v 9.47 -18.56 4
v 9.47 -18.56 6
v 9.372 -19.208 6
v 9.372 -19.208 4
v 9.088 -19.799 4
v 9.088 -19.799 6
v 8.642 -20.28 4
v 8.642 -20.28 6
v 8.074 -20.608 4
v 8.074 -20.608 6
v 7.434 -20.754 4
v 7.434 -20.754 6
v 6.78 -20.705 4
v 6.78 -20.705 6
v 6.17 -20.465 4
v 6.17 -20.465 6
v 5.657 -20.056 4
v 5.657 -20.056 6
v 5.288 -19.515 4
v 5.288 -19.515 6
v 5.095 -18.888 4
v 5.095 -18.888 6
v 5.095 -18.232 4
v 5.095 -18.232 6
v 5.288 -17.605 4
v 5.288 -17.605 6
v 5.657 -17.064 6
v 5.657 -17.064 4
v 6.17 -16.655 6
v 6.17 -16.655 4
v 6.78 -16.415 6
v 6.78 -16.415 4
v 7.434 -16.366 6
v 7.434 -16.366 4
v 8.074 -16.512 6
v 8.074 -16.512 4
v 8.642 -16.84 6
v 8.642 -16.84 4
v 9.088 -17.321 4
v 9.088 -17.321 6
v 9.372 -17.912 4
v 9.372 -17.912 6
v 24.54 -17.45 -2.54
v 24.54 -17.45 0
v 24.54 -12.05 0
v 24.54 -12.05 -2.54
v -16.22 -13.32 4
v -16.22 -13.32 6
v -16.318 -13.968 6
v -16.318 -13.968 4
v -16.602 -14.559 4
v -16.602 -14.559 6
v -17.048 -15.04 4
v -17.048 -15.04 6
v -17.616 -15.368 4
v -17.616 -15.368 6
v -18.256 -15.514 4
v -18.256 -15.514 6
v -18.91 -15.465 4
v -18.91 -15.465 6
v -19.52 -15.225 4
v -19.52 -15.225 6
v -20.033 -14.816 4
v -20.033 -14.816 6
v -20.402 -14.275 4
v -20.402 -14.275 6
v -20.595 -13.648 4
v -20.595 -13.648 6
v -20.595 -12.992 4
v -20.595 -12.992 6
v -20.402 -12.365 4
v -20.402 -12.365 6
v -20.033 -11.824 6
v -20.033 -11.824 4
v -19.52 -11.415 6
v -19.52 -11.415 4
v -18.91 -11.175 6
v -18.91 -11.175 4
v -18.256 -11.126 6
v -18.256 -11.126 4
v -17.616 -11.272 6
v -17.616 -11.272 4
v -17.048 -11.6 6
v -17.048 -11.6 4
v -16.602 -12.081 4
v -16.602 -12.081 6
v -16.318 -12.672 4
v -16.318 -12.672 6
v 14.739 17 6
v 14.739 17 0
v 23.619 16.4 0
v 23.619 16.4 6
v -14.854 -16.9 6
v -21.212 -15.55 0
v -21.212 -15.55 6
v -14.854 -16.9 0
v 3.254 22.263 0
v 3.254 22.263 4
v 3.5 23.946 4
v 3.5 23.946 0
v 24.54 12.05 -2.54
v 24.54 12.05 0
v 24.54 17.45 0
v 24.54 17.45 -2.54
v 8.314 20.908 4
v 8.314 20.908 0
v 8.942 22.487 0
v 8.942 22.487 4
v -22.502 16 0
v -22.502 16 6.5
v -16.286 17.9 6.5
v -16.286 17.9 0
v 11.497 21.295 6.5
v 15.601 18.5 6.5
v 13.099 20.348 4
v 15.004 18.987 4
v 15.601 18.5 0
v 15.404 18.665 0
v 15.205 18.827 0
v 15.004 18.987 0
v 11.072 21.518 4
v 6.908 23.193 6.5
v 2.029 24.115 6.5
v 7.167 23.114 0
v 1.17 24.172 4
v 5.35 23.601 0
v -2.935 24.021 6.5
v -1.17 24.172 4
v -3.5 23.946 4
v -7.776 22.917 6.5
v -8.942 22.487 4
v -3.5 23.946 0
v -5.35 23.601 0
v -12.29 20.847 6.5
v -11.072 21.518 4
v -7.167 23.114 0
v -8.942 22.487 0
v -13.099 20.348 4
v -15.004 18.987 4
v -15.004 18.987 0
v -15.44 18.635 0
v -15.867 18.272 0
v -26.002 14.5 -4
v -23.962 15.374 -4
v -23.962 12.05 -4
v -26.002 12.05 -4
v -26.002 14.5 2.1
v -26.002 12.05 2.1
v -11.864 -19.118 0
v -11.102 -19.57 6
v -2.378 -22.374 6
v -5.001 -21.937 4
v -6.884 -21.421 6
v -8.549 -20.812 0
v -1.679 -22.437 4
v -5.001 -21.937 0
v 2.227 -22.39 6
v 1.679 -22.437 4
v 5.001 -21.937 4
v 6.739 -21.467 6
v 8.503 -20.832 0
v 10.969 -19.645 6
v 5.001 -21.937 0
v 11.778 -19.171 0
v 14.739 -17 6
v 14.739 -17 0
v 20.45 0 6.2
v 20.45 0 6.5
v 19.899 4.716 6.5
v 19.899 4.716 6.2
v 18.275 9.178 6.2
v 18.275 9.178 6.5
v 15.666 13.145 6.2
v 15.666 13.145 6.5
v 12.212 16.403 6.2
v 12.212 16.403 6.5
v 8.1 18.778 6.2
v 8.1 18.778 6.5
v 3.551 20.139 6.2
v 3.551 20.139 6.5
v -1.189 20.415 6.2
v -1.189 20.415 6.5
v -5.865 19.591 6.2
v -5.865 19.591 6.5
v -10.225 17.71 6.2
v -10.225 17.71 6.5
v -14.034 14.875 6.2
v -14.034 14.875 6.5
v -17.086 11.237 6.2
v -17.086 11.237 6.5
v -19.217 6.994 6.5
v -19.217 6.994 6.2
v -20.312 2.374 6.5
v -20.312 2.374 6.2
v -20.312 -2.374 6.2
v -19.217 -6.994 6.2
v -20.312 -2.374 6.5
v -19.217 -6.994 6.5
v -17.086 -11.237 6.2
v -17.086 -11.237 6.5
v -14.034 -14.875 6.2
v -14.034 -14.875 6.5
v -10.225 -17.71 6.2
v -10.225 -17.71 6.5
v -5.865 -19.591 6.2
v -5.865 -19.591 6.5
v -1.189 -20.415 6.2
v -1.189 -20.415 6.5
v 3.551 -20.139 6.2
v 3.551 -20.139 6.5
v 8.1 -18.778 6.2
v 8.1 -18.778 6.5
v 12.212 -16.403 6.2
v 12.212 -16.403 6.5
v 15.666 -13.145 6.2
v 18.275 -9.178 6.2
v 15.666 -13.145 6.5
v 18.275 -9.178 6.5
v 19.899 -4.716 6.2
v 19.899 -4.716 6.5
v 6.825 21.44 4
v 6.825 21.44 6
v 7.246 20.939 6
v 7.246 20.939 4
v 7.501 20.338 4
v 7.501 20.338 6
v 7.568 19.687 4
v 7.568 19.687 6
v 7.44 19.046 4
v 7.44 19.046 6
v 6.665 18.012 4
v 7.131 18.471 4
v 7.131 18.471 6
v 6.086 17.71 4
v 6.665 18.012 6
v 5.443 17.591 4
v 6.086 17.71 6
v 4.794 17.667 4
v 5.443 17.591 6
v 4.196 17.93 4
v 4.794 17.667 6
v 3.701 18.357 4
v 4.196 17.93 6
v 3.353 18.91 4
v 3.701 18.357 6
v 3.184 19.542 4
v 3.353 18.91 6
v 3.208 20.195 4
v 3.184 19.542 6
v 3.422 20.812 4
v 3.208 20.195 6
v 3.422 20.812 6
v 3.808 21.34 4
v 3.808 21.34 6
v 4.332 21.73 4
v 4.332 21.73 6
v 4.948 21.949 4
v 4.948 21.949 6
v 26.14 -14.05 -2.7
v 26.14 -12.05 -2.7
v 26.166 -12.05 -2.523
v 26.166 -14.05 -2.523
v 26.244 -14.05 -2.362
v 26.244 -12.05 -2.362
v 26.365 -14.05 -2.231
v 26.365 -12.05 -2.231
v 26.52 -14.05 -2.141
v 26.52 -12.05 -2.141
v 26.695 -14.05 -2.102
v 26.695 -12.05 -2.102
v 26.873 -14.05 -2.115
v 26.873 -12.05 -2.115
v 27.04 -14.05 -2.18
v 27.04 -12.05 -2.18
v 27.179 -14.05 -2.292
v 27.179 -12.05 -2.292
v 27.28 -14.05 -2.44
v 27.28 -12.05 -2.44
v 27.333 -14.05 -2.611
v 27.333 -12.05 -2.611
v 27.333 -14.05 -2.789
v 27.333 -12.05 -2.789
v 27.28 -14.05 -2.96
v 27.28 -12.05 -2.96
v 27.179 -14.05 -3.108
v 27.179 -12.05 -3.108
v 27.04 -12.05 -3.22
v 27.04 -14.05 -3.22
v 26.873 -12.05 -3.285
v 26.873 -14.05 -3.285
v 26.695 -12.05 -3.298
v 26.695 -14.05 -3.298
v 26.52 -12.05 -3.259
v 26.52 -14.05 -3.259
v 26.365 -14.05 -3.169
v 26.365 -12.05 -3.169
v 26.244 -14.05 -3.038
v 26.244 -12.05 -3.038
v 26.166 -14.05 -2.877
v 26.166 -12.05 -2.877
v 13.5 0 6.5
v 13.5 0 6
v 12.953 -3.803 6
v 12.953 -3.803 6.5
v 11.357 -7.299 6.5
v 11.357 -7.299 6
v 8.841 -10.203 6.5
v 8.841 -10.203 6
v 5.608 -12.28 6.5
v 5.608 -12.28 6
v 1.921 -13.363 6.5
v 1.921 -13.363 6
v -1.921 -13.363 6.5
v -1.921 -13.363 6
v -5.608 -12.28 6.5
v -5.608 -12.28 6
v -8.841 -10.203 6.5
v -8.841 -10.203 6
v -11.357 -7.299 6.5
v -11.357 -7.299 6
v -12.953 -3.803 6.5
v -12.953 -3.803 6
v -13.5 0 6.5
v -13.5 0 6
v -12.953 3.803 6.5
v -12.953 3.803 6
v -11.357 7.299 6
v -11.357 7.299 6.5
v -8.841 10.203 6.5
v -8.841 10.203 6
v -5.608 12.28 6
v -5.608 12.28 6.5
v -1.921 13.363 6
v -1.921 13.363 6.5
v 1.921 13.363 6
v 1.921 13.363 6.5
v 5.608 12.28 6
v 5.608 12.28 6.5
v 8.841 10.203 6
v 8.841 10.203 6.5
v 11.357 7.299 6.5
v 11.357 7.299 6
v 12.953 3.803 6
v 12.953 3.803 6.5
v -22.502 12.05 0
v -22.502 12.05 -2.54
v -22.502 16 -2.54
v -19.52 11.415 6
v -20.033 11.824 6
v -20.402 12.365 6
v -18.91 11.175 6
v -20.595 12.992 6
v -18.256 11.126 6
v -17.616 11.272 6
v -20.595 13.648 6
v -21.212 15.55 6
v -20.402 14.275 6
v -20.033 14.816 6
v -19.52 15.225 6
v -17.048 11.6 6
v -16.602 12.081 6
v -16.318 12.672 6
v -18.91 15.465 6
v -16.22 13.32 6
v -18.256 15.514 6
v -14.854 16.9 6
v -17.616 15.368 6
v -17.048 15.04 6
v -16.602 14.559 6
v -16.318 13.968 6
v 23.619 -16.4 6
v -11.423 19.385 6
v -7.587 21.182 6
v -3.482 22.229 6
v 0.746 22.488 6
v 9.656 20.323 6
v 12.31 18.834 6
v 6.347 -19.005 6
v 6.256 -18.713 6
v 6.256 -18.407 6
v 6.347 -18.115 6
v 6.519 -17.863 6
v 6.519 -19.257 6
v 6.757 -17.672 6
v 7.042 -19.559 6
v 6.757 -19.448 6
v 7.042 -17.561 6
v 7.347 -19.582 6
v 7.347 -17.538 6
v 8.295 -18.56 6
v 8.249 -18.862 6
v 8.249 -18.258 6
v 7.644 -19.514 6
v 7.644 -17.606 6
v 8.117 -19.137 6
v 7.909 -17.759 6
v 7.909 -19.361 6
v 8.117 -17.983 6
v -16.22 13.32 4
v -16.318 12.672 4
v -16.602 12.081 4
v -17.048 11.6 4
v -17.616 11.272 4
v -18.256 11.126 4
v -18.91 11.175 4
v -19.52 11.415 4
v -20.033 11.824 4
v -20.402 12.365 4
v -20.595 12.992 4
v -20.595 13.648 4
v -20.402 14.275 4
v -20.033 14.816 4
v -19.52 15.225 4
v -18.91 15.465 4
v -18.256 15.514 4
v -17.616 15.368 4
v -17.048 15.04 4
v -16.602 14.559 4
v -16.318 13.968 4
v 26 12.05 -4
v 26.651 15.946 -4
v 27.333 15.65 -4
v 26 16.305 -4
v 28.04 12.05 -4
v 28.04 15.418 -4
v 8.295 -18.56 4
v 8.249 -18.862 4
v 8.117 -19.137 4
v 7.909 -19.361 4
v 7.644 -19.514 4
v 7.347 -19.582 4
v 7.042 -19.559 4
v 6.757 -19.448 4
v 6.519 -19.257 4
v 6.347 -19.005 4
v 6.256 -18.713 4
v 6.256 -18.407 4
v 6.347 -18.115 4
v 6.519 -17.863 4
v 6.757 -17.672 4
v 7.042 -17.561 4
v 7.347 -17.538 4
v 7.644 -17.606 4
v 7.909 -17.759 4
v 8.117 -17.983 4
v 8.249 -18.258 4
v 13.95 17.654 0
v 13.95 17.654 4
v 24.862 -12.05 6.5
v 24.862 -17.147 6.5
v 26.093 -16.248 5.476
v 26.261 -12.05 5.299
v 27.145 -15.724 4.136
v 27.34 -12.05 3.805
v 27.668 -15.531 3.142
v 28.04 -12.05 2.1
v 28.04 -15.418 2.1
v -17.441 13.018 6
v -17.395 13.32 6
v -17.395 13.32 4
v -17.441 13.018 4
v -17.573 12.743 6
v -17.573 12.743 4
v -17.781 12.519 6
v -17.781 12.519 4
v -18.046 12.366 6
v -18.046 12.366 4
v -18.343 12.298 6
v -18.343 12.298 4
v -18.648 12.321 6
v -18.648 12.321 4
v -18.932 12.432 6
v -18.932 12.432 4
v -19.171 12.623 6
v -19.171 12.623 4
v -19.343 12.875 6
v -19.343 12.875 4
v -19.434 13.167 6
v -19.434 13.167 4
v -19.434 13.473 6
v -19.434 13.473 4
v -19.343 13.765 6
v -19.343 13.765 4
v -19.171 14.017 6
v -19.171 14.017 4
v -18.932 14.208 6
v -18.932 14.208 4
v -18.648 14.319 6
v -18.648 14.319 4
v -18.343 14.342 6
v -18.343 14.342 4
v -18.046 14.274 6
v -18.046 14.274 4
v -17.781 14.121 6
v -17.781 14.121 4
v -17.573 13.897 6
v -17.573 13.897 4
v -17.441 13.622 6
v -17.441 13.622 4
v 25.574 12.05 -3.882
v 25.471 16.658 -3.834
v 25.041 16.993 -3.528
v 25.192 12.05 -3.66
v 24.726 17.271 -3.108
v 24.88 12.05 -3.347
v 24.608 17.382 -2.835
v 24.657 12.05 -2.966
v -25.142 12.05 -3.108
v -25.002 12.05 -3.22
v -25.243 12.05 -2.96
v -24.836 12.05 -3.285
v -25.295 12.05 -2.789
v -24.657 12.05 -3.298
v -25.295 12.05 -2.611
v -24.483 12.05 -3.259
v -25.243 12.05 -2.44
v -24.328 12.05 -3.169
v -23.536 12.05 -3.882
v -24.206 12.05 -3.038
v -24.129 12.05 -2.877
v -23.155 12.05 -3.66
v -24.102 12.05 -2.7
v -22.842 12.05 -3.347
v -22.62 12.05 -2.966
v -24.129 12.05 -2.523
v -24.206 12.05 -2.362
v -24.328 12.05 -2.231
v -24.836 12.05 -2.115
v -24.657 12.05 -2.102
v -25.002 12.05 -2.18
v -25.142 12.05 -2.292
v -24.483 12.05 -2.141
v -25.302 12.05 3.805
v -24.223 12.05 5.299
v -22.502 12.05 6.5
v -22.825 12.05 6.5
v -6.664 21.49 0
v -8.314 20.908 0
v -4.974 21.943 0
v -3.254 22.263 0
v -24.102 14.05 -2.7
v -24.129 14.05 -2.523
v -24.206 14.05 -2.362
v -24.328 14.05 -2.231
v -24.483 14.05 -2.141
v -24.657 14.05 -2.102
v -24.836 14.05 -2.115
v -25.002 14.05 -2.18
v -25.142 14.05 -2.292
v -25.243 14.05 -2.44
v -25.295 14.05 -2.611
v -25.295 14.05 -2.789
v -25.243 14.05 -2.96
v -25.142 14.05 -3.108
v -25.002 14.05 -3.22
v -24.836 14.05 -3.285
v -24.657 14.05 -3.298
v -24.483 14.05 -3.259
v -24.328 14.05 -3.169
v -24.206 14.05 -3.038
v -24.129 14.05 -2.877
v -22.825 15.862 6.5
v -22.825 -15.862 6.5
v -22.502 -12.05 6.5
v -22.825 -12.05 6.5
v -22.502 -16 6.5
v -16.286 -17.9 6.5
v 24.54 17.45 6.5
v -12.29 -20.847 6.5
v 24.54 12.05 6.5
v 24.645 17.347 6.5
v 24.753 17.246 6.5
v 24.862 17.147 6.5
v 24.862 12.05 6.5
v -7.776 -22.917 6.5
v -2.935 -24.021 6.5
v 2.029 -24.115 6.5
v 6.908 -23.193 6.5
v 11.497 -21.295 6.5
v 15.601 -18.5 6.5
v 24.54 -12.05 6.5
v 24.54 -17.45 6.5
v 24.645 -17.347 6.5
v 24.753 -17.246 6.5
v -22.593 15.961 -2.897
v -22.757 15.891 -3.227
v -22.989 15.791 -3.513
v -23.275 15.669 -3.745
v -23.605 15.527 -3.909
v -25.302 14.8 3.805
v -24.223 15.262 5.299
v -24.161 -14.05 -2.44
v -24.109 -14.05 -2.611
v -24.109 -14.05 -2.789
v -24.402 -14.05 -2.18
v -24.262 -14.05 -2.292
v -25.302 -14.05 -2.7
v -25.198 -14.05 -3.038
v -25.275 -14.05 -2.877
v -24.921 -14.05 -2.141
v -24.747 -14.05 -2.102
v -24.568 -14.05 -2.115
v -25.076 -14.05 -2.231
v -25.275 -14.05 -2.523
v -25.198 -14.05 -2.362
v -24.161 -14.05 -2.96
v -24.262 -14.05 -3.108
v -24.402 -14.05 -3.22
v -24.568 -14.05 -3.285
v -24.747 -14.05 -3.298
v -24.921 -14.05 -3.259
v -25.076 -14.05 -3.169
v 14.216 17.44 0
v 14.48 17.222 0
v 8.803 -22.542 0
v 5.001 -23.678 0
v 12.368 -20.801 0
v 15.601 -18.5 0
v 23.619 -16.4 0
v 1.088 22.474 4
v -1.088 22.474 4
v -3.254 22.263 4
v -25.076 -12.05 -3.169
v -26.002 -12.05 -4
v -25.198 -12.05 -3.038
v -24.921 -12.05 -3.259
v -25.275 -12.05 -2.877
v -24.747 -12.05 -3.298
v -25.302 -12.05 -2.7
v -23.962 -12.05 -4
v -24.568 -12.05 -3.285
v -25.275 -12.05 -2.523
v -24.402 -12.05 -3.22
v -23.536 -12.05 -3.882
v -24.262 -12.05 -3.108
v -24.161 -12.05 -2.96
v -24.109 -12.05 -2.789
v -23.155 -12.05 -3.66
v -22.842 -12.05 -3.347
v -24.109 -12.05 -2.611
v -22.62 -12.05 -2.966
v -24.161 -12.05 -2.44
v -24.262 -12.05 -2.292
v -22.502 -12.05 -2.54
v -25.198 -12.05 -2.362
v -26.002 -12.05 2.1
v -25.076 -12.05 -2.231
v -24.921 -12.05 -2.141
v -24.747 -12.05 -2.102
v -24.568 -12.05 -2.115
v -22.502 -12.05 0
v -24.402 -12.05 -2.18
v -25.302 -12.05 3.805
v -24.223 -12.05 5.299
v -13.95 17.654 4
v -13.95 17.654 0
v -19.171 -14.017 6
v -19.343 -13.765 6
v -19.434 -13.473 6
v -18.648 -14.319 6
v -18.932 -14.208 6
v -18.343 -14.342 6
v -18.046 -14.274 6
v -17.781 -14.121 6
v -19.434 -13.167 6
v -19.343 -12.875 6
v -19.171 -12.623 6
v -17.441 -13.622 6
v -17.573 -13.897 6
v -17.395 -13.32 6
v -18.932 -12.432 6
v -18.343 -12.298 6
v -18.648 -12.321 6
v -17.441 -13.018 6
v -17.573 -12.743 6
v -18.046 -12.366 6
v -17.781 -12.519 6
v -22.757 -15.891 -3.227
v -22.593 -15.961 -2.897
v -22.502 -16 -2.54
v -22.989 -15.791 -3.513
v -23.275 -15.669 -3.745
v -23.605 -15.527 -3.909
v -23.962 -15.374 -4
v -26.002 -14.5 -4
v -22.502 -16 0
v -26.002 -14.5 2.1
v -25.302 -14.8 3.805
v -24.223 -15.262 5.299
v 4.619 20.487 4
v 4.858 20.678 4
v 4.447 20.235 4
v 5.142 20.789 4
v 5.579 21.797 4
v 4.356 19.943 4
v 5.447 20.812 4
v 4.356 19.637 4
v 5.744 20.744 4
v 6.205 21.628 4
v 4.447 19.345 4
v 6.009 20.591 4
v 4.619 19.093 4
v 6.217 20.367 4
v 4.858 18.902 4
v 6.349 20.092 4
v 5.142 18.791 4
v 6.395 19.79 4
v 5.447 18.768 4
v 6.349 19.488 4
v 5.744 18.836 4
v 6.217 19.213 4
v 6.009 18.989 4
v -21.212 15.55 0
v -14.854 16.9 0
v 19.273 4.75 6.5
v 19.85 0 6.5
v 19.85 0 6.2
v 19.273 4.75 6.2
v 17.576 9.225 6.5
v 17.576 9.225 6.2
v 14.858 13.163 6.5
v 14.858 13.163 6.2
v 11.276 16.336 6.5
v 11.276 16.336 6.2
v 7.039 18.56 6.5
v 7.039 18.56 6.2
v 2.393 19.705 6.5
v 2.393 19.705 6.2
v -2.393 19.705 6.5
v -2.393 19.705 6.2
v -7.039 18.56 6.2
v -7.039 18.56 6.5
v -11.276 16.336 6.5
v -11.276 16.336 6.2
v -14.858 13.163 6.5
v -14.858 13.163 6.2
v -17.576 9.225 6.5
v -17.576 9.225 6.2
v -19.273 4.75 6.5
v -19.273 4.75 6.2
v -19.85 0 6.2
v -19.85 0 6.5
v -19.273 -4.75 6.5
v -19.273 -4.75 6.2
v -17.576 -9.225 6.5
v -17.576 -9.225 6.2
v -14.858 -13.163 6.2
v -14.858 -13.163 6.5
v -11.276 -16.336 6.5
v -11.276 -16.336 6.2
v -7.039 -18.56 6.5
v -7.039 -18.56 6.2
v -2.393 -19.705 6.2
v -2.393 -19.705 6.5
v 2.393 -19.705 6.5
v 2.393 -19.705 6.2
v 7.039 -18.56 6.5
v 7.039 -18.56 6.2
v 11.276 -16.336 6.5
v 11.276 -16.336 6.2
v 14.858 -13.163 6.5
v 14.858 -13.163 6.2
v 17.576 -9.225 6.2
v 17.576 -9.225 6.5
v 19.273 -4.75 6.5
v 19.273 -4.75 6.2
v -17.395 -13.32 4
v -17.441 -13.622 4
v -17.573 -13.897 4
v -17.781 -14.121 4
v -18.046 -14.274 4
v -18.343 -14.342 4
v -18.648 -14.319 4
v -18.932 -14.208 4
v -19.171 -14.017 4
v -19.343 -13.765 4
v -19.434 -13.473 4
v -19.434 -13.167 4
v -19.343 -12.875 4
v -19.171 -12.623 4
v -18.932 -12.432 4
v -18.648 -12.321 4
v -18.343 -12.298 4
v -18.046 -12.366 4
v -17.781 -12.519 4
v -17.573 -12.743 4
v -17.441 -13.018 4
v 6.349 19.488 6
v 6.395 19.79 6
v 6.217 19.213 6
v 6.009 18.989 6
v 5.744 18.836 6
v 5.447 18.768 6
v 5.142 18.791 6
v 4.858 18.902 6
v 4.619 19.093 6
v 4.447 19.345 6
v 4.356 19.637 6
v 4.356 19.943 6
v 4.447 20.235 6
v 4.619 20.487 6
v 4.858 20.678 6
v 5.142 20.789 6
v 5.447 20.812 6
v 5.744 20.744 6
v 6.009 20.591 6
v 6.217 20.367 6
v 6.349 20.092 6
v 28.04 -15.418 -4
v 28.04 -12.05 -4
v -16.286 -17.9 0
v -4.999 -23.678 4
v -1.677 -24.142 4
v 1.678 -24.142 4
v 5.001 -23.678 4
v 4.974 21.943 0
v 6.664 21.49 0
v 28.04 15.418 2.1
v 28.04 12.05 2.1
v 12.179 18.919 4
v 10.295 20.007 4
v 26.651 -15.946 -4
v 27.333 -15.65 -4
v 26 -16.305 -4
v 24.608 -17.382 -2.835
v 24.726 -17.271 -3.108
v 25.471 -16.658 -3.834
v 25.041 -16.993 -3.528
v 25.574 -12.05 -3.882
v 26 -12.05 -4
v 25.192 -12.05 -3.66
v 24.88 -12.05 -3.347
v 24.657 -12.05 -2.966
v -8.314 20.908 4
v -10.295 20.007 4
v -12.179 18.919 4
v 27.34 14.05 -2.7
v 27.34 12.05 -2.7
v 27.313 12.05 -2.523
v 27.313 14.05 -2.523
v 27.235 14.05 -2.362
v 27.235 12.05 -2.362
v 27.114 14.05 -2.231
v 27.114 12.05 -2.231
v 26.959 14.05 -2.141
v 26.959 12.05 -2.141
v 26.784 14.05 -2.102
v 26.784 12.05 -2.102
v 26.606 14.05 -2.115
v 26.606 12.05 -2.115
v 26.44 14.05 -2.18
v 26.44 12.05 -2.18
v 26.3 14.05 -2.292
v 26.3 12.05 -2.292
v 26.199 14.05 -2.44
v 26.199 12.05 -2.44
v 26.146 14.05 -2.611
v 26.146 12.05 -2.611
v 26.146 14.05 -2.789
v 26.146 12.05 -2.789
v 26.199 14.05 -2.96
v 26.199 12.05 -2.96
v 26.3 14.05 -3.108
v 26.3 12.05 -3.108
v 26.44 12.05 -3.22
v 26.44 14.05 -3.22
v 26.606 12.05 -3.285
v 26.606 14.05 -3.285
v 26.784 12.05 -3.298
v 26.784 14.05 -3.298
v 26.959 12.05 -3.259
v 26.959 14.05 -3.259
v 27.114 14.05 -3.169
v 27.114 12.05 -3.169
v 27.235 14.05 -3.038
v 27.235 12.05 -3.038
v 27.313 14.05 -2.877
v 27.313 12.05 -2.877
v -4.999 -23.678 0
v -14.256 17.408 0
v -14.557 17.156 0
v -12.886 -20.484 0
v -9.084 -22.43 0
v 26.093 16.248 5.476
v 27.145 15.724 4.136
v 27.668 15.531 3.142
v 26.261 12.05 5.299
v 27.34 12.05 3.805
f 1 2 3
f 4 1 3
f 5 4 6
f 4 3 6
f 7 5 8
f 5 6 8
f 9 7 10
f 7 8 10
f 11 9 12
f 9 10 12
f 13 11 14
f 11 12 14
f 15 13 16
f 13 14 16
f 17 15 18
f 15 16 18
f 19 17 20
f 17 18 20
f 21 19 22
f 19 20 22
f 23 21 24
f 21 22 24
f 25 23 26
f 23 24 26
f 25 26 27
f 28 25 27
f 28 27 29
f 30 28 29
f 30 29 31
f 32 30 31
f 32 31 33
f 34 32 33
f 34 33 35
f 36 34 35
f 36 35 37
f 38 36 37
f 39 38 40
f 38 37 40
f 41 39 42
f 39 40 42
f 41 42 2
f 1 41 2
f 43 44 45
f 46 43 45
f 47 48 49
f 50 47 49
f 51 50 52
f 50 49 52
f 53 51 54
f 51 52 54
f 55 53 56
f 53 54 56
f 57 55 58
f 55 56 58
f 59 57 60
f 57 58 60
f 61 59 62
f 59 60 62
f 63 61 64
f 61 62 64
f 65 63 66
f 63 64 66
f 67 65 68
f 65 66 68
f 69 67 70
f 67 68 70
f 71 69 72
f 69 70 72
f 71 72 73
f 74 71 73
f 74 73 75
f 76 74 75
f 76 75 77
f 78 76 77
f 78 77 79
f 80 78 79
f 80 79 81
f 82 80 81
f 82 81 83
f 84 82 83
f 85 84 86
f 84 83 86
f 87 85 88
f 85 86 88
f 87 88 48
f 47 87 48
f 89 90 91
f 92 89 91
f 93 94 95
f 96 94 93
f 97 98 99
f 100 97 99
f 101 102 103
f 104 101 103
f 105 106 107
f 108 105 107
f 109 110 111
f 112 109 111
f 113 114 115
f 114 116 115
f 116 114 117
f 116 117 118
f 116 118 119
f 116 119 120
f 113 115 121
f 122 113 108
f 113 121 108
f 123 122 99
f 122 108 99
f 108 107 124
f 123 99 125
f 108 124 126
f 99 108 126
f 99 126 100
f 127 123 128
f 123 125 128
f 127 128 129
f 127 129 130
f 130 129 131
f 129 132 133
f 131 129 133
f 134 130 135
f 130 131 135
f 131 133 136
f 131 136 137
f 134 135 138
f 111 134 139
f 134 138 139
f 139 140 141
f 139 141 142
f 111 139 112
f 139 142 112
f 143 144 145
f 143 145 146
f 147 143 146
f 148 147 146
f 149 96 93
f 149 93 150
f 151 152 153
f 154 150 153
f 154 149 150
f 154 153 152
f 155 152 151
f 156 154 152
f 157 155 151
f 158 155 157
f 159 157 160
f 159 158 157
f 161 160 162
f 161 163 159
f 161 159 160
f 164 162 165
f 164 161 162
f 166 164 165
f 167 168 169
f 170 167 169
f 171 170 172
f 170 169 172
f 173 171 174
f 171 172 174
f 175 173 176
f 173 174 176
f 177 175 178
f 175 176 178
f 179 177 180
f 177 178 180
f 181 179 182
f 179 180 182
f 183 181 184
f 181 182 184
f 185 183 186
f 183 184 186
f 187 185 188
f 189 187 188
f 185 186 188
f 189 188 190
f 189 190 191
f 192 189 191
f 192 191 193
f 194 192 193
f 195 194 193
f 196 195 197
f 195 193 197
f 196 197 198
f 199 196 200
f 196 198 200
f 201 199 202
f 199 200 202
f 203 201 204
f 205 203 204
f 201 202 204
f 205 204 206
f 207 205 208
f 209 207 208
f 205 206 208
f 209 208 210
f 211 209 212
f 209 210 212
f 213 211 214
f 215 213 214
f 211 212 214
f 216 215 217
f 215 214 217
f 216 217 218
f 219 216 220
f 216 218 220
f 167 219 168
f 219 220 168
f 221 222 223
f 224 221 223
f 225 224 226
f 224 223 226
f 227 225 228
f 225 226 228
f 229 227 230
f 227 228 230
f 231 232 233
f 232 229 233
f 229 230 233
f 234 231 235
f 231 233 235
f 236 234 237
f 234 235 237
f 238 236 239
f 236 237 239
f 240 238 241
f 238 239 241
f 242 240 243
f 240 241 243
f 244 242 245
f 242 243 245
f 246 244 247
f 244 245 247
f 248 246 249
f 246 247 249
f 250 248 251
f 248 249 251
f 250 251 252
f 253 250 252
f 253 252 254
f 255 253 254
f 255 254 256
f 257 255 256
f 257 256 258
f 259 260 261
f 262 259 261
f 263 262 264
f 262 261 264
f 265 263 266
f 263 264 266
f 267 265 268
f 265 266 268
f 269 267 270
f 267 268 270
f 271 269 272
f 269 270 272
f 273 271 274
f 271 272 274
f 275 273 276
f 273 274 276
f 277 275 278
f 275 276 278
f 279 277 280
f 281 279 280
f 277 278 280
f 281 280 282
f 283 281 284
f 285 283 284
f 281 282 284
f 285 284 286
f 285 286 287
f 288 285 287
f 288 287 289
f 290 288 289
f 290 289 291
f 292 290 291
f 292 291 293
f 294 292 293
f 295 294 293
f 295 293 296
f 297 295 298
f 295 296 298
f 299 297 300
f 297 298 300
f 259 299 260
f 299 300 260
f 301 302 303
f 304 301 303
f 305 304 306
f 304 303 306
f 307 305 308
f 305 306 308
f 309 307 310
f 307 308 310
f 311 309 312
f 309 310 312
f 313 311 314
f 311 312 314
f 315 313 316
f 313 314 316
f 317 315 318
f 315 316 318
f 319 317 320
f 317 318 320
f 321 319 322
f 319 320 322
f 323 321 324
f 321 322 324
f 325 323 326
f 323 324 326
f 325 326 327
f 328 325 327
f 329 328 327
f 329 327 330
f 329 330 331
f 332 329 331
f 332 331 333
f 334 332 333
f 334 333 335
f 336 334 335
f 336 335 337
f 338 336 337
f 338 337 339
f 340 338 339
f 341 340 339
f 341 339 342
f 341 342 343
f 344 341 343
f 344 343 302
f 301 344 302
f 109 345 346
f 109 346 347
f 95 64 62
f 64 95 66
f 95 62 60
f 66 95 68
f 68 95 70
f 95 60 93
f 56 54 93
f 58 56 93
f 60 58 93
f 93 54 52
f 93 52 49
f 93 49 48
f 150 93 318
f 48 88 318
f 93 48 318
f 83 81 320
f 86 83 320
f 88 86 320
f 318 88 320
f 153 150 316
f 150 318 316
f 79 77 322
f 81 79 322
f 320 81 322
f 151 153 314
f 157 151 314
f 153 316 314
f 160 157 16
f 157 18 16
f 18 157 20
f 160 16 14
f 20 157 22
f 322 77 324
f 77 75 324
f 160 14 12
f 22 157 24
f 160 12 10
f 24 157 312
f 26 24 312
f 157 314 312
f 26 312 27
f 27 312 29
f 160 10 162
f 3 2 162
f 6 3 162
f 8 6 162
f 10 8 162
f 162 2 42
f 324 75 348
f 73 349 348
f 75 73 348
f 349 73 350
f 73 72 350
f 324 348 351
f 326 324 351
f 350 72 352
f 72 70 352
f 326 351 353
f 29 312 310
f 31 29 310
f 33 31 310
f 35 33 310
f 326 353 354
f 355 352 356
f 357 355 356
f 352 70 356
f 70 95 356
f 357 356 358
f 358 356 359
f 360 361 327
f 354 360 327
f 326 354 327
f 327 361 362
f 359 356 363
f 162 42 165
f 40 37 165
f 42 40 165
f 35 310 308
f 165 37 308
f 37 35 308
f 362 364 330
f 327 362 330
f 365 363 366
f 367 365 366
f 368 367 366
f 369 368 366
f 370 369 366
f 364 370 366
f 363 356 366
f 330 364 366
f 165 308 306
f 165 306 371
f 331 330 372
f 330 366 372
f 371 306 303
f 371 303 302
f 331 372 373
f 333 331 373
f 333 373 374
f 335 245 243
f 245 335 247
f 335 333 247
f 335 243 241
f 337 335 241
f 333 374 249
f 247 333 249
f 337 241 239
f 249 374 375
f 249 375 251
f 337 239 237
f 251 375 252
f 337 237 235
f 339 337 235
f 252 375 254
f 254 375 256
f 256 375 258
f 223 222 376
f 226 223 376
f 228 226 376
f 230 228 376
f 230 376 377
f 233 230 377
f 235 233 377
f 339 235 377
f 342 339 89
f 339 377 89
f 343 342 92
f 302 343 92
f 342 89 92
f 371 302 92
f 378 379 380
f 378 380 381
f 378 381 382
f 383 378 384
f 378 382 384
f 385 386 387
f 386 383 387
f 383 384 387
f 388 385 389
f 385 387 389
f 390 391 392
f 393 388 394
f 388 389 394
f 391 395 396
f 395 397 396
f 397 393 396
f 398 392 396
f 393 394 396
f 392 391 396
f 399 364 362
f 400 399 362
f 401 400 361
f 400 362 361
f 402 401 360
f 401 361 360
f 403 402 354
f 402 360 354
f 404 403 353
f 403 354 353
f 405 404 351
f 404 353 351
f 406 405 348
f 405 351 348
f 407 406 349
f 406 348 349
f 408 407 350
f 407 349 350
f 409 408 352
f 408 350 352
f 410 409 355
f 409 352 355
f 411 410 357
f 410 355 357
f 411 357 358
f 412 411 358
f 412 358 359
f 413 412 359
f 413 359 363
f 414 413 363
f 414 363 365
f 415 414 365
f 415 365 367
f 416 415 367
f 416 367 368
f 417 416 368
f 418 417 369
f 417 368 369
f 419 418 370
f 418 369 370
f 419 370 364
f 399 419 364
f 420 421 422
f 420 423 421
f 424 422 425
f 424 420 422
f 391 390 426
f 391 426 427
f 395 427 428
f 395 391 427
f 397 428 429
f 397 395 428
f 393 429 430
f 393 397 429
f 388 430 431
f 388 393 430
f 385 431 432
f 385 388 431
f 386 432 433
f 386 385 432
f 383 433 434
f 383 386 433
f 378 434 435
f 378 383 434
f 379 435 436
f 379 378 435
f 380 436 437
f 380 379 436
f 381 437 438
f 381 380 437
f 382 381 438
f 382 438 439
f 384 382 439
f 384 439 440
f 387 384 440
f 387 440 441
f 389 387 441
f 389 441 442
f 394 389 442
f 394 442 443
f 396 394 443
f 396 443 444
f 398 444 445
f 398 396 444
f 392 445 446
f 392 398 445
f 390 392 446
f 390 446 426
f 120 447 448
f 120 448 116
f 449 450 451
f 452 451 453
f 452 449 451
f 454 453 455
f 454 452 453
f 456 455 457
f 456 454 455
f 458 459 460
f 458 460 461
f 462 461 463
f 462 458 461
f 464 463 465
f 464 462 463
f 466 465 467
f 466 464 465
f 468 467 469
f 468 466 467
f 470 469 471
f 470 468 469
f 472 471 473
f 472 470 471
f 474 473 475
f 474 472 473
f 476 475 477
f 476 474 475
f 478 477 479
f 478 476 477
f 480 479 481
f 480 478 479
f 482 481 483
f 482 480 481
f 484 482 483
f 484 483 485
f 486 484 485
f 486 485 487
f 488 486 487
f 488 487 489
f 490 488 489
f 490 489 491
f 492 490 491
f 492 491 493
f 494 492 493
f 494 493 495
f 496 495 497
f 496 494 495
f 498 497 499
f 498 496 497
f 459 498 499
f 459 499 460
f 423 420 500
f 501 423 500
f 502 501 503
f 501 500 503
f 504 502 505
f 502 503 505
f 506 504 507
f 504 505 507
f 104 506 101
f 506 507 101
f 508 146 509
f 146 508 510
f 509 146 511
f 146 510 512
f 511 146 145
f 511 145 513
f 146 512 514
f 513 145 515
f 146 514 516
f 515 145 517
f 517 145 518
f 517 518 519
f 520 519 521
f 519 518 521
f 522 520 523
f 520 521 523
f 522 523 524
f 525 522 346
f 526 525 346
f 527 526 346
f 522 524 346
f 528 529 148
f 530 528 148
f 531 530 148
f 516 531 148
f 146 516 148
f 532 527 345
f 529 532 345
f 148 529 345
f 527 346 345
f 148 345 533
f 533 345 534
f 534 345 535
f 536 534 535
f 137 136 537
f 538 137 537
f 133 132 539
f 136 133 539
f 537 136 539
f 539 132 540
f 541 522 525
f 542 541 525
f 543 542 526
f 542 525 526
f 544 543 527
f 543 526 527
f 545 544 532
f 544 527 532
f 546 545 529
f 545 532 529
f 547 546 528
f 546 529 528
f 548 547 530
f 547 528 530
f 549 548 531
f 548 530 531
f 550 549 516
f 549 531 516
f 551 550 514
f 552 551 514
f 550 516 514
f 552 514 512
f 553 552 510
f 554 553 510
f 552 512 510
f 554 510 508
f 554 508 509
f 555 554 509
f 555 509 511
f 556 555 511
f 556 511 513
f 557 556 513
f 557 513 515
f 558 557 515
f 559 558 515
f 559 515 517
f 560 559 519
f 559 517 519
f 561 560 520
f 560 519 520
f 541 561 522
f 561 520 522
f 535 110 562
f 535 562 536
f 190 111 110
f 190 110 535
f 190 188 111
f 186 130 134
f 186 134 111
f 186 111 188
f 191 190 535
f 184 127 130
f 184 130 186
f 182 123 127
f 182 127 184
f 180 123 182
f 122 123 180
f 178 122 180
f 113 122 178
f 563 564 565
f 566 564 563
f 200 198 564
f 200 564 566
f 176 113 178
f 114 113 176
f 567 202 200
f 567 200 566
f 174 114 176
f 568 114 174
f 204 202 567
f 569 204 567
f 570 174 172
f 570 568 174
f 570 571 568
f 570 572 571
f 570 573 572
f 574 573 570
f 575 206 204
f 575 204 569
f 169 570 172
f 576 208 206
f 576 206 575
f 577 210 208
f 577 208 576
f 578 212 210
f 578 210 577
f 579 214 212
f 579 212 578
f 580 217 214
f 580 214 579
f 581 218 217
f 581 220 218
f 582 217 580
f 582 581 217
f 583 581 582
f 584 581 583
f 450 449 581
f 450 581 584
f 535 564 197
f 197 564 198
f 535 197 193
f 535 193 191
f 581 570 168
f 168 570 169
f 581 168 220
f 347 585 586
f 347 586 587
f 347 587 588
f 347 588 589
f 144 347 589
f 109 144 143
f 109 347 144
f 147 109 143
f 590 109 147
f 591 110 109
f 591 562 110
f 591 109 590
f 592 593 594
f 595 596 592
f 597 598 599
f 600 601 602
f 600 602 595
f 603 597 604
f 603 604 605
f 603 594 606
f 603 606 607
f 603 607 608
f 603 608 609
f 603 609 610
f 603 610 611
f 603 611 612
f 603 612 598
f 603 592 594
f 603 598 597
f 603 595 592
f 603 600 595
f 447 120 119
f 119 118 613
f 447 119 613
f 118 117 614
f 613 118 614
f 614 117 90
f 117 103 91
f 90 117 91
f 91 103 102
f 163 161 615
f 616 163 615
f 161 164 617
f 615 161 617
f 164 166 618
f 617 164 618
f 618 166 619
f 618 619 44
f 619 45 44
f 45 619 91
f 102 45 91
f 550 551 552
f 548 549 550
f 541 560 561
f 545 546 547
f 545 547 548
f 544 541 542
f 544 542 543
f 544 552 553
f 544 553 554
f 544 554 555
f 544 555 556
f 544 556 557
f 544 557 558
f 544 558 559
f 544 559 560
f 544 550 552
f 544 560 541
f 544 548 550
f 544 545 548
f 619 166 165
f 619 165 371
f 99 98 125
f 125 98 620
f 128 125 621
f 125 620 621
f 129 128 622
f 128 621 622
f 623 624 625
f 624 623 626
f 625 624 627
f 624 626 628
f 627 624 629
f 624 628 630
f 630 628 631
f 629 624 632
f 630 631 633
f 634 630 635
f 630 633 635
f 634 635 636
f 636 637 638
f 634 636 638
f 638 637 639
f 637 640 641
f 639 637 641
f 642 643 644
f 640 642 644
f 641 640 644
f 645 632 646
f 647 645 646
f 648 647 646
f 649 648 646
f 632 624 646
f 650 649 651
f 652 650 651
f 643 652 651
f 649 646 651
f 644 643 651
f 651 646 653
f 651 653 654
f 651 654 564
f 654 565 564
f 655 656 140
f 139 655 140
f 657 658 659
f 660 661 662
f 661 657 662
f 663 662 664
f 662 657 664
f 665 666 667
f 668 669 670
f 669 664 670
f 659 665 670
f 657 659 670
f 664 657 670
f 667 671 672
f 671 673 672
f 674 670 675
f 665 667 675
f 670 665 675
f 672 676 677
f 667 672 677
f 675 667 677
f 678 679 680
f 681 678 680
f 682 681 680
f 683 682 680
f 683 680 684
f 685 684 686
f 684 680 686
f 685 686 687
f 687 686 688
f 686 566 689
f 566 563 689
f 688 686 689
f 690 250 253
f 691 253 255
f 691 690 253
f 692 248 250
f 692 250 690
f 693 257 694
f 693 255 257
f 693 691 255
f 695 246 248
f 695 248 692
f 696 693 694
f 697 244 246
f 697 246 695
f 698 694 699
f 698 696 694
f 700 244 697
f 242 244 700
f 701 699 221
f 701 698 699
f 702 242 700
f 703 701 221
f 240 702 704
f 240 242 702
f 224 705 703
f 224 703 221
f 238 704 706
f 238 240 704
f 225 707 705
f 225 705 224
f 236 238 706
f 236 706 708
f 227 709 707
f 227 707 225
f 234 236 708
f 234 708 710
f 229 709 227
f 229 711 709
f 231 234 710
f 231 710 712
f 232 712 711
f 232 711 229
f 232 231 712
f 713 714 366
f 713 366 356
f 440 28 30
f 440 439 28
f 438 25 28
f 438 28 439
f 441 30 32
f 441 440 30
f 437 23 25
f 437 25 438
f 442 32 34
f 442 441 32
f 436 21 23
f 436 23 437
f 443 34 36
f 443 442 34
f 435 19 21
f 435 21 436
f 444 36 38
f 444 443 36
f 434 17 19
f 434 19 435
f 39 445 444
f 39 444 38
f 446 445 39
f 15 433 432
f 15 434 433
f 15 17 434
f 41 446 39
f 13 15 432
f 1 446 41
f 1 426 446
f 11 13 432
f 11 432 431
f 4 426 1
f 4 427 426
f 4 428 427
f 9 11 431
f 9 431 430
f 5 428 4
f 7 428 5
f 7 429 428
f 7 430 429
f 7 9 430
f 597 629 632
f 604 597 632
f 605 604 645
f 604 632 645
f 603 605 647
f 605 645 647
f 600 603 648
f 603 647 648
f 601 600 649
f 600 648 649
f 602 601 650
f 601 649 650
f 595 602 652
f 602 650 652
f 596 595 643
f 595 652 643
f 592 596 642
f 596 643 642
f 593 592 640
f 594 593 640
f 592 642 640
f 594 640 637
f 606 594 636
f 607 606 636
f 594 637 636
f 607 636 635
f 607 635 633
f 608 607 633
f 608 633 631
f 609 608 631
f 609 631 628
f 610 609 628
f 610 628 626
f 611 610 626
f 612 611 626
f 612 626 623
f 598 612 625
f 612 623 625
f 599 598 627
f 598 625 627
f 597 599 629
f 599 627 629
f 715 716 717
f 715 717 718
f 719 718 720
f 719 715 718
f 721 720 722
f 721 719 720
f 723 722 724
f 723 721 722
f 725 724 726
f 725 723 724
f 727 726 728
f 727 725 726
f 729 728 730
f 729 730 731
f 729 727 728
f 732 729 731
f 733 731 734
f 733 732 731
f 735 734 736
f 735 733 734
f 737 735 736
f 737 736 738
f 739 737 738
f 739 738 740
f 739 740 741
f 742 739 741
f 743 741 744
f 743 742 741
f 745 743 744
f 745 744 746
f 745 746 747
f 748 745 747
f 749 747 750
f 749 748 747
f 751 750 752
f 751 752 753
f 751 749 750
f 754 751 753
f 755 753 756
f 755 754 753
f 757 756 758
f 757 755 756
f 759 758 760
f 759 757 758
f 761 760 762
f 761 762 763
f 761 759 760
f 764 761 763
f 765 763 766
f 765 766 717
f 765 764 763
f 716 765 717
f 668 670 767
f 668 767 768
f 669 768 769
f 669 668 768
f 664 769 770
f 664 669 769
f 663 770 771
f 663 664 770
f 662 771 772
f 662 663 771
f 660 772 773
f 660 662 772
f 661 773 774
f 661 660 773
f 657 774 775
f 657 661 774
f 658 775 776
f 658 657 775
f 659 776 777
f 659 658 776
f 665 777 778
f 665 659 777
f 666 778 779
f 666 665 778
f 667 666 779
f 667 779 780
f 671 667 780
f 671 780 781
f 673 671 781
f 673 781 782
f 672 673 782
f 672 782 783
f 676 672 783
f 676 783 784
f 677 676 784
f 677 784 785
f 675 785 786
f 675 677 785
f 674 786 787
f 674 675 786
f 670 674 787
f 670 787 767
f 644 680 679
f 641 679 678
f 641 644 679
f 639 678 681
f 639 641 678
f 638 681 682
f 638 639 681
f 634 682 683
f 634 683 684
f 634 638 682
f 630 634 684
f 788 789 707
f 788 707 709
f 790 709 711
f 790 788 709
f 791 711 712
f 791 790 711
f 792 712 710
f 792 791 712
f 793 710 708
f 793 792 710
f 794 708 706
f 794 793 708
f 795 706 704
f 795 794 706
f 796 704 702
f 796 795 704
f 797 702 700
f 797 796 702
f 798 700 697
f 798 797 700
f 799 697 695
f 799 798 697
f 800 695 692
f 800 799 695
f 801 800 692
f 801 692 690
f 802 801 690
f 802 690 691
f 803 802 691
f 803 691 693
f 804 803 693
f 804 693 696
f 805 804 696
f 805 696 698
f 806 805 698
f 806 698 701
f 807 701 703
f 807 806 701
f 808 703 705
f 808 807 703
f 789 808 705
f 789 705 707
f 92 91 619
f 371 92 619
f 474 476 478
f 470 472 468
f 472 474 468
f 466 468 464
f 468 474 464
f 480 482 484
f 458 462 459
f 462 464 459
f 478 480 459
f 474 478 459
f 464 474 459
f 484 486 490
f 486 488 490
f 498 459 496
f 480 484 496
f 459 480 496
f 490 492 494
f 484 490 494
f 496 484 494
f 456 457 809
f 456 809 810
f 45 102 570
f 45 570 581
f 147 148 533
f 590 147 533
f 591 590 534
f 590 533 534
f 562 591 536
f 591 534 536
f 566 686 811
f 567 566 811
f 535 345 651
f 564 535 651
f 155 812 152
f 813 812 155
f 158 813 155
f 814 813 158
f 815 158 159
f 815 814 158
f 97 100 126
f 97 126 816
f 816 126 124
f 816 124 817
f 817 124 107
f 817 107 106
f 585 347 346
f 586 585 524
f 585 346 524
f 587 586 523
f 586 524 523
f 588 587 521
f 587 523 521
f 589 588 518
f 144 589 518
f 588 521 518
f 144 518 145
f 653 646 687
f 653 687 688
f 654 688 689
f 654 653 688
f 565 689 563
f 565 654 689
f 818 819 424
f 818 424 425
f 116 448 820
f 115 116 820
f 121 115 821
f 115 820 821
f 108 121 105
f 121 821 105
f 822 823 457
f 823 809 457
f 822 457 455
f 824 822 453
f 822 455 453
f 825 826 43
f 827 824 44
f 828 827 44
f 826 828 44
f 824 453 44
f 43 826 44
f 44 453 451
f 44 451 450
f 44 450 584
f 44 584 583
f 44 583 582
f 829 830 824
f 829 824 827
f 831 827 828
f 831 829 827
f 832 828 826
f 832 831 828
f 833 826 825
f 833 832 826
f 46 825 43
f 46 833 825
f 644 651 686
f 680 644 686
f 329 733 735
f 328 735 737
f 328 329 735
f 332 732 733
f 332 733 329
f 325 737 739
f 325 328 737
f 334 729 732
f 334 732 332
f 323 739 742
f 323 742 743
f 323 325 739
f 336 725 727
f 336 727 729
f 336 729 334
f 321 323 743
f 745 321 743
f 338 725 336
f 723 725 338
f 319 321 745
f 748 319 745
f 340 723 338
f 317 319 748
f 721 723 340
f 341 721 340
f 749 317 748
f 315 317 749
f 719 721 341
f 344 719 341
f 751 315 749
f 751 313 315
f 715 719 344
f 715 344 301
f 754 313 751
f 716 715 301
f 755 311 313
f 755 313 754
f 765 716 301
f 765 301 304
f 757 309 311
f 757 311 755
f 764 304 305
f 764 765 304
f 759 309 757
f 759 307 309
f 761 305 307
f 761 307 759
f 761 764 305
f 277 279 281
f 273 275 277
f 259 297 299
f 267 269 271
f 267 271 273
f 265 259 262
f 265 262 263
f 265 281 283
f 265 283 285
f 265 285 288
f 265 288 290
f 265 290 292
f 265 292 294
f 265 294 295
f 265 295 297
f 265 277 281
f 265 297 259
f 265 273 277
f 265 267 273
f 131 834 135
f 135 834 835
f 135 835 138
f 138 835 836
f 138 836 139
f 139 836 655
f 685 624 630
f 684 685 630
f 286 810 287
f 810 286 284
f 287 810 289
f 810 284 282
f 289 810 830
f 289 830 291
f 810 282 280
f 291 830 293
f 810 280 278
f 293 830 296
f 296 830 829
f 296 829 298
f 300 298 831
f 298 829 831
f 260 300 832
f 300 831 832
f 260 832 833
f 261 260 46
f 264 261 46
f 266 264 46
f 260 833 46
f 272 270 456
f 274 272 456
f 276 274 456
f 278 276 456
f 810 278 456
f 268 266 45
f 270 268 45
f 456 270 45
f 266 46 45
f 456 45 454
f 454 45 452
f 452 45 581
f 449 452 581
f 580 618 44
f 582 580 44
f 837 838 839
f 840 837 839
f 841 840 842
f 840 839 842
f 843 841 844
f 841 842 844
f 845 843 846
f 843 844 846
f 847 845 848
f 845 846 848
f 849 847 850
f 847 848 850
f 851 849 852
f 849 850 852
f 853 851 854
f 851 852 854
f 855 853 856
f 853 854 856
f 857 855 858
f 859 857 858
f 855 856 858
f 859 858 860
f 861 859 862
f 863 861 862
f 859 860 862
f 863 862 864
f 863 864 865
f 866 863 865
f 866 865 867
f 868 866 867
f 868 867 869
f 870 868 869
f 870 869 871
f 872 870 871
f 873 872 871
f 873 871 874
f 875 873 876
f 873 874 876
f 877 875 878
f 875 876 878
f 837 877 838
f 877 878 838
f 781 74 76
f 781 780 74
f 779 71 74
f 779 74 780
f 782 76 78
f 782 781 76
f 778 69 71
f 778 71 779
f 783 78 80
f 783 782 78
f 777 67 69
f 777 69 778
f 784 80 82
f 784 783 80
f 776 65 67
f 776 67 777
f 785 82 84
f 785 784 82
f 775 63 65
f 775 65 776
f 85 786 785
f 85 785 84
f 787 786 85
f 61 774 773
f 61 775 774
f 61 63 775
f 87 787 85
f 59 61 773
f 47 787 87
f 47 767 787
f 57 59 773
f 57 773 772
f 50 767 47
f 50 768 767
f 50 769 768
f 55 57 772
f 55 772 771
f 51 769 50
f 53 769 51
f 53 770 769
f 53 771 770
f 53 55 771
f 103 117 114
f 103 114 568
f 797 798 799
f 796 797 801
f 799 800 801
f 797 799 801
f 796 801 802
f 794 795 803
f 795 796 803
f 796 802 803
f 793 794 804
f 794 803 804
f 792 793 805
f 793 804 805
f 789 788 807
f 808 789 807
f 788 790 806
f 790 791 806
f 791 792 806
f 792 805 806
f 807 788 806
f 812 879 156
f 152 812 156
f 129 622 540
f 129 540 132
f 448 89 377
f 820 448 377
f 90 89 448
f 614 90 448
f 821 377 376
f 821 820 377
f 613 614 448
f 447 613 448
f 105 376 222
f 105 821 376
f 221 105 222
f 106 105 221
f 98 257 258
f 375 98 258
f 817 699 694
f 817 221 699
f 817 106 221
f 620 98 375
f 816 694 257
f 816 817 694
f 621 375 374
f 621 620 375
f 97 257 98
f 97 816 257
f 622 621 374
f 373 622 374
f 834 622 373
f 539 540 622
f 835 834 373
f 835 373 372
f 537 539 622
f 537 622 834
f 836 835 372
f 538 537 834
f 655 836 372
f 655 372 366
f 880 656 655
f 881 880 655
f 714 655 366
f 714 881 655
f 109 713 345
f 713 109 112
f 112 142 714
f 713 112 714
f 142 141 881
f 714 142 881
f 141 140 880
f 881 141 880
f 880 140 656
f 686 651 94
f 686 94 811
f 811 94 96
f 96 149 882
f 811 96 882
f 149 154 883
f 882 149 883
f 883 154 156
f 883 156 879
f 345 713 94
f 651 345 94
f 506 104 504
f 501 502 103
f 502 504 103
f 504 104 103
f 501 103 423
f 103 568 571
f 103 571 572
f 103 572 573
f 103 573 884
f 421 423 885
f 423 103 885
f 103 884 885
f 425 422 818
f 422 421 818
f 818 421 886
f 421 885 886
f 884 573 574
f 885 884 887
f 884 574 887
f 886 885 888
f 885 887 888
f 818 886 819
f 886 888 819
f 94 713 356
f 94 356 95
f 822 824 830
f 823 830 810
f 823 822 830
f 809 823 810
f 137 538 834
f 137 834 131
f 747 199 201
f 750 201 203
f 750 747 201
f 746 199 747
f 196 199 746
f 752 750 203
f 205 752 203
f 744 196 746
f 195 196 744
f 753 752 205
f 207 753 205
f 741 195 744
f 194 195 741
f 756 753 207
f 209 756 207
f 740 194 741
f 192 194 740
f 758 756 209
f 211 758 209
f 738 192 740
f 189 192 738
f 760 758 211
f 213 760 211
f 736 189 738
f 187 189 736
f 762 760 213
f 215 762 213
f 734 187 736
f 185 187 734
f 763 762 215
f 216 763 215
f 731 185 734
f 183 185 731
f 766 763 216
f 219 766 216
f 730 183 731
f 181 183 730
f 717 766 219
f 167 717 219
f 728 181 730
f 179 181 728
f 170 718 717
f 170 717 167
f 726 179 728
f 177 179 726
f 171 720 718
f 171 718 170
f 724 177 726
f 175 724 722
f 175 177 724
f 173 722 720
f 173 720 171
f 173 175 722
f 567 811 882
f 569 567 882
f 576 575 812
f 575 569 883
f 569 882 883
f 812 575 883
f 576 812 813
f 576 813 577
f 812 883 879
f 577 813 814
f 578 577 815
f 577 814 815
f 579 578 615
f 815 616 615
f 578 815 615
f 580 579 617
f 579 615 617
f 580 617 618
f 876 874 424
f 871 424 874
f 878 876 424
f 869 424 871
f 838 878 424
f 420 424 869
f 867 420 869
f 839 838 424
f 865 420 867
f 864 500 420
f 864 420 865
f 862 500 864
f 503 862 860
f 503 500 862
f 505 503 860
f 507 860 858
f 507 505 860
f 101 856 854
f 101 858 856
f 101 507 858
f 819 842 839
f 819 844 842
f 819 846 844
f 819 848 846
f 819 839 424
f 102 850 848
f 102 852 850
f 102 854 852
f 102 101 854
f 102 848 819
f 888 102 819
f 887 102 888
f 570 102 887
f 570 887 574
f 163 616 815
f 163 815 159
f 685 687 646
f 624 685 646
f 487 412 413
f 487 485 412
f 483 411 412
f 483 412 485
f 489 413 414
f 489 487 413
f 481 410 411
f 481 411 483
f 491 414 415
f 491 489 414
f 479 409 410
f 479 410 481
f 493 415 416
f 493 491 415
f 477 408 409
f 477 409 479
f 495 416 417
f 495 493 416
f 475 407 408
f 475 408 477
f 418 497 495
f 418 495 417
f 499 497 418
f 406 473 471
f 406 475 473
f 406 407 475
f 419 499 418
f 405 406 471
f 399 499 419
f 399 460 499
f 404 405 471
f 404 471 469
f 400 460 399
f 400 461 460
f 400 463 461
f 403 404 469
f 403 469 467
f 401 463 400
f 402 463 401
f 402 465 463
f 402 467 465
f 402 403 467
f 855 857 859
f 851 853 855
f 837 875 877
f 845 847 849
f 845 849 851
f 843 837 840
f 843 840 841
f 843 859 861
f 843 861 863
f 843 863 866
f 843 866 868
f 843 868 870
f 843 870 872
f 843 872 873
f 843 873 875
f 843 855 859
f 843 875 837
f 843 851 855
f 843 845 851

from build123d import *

# Parameters (mm, degrees)
PAD_DEPTH            = 6.5
POCKET_DEPTH         = 6
SKETCH002_R          = 13.5
POCKET001_DEPTH      = 1
SKETCH003_W          = 5.4
SKETCH003_H          = 6.5
PAD001_DEPTH         = 3.5
POCKET002_DEPTH      = 10
SKETCH010_W          = 3.95
SKETCH010_H          = 6.5
PAD002_DEPTH         = 3.5
POCKET005_DEPTH      = 10
SKETCH014_R          = 20.45
SKETCH014_R_2        = 19.85
POCKET008_DEPTH      = 0.3
SKETCH015_R          = 2.2
SKETCH015_R_2        = 1.025
PAD003_DEPTH         = 2
POCKET009_DEPTH      = 4
POCKET010_DEPTH      = 4
PAD004_DEPTH         = 4
POCKET013_DEPTH      = 12.151
POCKET013_DEPTH_BACK = 36.251
SKETCH022_R          = 0.6
POCKET014_DEPTH      = 2
SKETCH023_R          = 0.6
POCKET015_DEPTH      = 2


with BuildPart() as part:
    # Sketch → Pad (new body)
    with BuildSketch(Plane.XY):
        with BuildLine():
            Line((-22.5019915649, 16), (-22.5019915649, -16))
            Line((-22.5019915649, -16), (-16.2858834578, -17.9))
            ThreePointArc((-16.2858834578, -17.9), (-0.4552796053, -24.1957169863), (15.6009615088, -18.5))
            Line((15.6009615088, -18.5), (24.5395016581, -17.45))
            Line((24.5395016581, 17.45), (24.5395016581, -17.45))
            Line((15.6009615088, 18.5), (24.5395016581, 17.45))
            ThreePointArc((15.6009615088, 18.5), (-0.4552796053, 24.1957169863), (-16.2858834578, 17.9))
            Line((-22.5019915649, 16), (-16.2858834578, 17.9))
        make_face()
    extrude(amount=PAD_DEPTH)

    # Sketch001 → Pocket (cut)
    with BuildSketch(Plane.XY):
        with BuildLine():
            Line((-14.8539557021, 16.9), (-21.2122180433, 15.55))
            Line((-21.2122180433, 15.55), (-21.2122180433, -15.55))
            Line((-21.2122180433, -15.55), (-14.8539557021, -16.9))
            ThreePointArc((-14.8539557021, -16.9), (-0.0760301383, -22.4998715423), (14.739402973, -17))
            Line((14.739402973, -17), (23.6191552218, -16.4))
            Line((23.6191552218, 16.4), (23.6191552218, -16.4))
            Line((14.739402973, 17), (23.6191552218, 16.4))
            ThreePointArc((14.739402973, 17), (-0.0760301383, 22.4998715423), (-14.8539557021, 16.9))
        make_face()
    extrude(amount=POCKET_DEPTH, mode=Mode.SUBTRACT)

    # Sketch002 (on Face19 of Pocket) → Pocket001 (cut)
    with BuildSketch(Plane(origin=(0, 0, 6), x_dir=(1, 0, 0), z_dir=(0, 0, -1))):
        Circle(SKETCH002_R)
    extrude(amount=-POCKET001_DEPTH, mode=Mode.SUBTRACT)

    # Sketch003 (on Face7 of Pad) → Pad001 (join)
    with BuildSketch(Plane.YZ.offset(24.5395016581)):
        with Locations((-14.75, 3.25)):
            Rectangle(SKETCH003_W, SKETCH003_H)
        with Locations((14.75, 3.25)):
            Rectangle(SKETCH003_W, SKETCH003_H)
    extrude(amount=PAD001_DEPTH)

    # Sketch006 (on Face22 of Pad001) → Pocket002 (cut)
    with BuildSketch(Plane.XY.offset(6.5)):
        with BuildLine():
            ThreePointArc((24.5395016581, 17.45), (26.1592830786, 16.2095505764), (28.0395016581, 15.4176006311))
            Line((28.0395016581, 17.45), (28.0395016581, 15.4176006311))
            Line((28.0395016581, 17.45), (24.5395016581, 17.45))
        make_face()
        with BuildLine():
            ThreePointArc((28.0395016581, -15.4176006311), (26.1592830786, -16.2095505765), (24.5395016581, -17.4500000001))
            Line((28.0395016581, -17.45), (24.5395016581, -17.45))
            Line((28.0395016581, -15.4176006311), (28.0395016581, -17.45))
        make_face()
    extrude(amount=-POCKET002_DEPTH, mode=Mode.SUBTRACT)

    # Sketch010 (on Face3 of Pad) → Pad002 (join)
    with BuildSketch(Plane(origin=(-22.5019915649, 0, 0), x_dir=(0, -1, 0), z_dir=(-1, 0, 0))):
        with Locations((-14.025, 3.25)):
            Rectangle(SKETCH010_W, SKETCH010_H)
        with Locations((14.025, 3.25)):
            Rectangle(SKETCH010_W, SKETCH010_H)
    extrude(amount=PAD002_DEPTH)

    # Sketch011 (on Face28 of Pad002) → Pocket005 (cut)
    with BuildSketch(Plane.XY.offset(6.5)):
        Polygon((-26.0019915649, 16), (-22.5019915649, 16), (-26.0019915649, 14.5), align=None)
        Polygon((-22.5019915649, -16), (-26.0019915649, -14.5), (-26.0019915649, -16), align=None)
    extrude(amount=-POCKET005_DEPTH, mode=Mode.SUBTRACT)

    # Sketch014 (on Face10 of Pad) → Pocket008 (cut)
    with BuildSketch(Plane.XY.offset(6.5)):
        Circle(SKETCH014_R)
        Circle(SKETCH014_R_2, mode=Mode.SUBTRACT)
    extrude(amount=-POCKET008_DEPTH, mode=Mode.SUBTRACT)

    # Sketch015 (on Face19 of Pocket) → Pad003 (join)
    with BuildSketch(Plane(origin=(0, 0, 6), x_dir=(1, 0, 0), z_dir=(0, 0, -1))):
        with Locations((-18.42, 13.32)):
            Circle(SKETCH015_R)
        with Locations((-18.42, 13.32)):
            Circle(SKETCH015_R_2, mode=Mode.SUBTRACT)
        with Locations((7.27, 18.56)):
            Circle(SKETCH015_R)
        with Locations((7.27, 18.56)):
            Circle(SKETCH015_R_2, mode=Mode.SUBTRACT)
        with Locations((5.37, -19.79)):
            Circle(SKETCH015_R)
        with Locations((5.37, -19.79)):
            Circle(SKETCH015_R_2, mode=Mode.SUBTRACT)
        with Locations((-18.42, -13.32)):
            Circle(SKETCH015_R)
        with Locations((-18.42, -13.32)):
            Circle(SKETCH015_R_2, mode=Mode.SUBTRACT)
    extrude(amount=PAD003_DEPTH)

    # Sketch016 (on Face4 of Pocket) → Pocket009 (cut)
    with BuildSketch(Plane(origin=(0, 0, 0), x_dir=(1, 0, 0), z_dir=(0, 0, -1))):
        with BuildLine():
            Line((-4.9992330338, 23.6779996848), (-5.0007669662, 21.9372361465))
            ThreePointArc((5.0007669662, 21.9372361465), (0, 22.5), (-5.0007669662, 21.9372361465))
            Line((5.0007669662, 23.6776757675), (5.0007669662, 21.9372361465))
            ThreePointArc((5.0007669662, 23.6776757675), (0.00078388, 24.1999999873), (-4.9992330338, 23.6779996848))
        make_face()
    extrude(amount=-POCKET009_DEPTH, mode=Mode.SUBTRACT)

    # Sketch017 (on Face4 of Pocket) → Pocket010 (cut)
    with BuildSketch(Plane(origin=(0, 0, 0), x_dir=(1, 0, 0), z_dir=(0, 0, -1))):
        with BuildLine():
            ThreePointArc((-3.2541322314, -22.2634369184), (0, -22.5), (3.2541322314, -22.2634369184))
            Line((3.2541322314, -22.2634369184), (3.5, -23.9455632634))
            ThreePointArc((-3.5, -23.9455632634), (0, -24.2), (3.5, -23.9455632634))
            Line((-3.2541322314, -22.2634369184), (-3.5, -23.9455632634))
        make_face()
        with BuildLine():
            ThreePointArc((-13.9498796389, -17.6536358312), (-11.25, -19.4855715851), (-8.3135572795, -20.9077680626))
            Line((-8.3135572795, -20.9077680626), (-8.9416927184, -22.487466094))
            ThreePointArc((-15.0038705449, -18.987466094), (-12.1, -20.9578147716), (-8.9416927184, -22.487466094))
            Line((-13.9498796389, -17.6536358312), (-15.0038705449, -18.987466094))
        make_face()
        with BuildLine():
            ThreePointArc((8.3135572795, -20.9077680626), (11.25, -19.4855715851), (13.9498796389, -17.6536358312))
            Line((13.9498796389, -17.6536358312), (15.0038705449, -18.987466094))
            ThreePointArc((8.9416927184, -22.487466094), (12.1, -20.9578147716), (15.0038705449, -18.987466094))
            Line((8.3135572795, -20.9077680626), (8.9416927184, -22.487466094))
        make_face()
    extrude(amount=-POCKET010_DEPTH, mode=Mode.SUBTRACT)

    # Sketch018 (on Face8 of Pocket005) → Pad004 (join)
    with BuildSketch(Plane(origin=(0, 0, 0), x_dir=(1, 0, 0), z_dir=(0, 0, -1))):
        Polygon((-26.0019915649, 14.5), (-26.0019915649, 12.05), (-22.5019915649, 12.05), (-22.5019915649, 16), align=None)
        Polygon((-26.0019915649, -12.05), (-22.5019915649, -12.05), (-22.5019915649, -16), (-26.0019915649, -14.5), align=None)
        with BuildLine():
            Line((24.5395016581, 17.4500000001), (24.5395016581, 12.05))
            Line((28.0395016581, 12.05), (24.5395016581, 12.05))
            Line((28.0395016581, 15.4176006311), (28.0395016581, 12.05))
            ThreePointArc((24.5395016581, 17.4500000001), (26.1592830786, 16.2095505765), (28.0395016581, 15.4176006311))
        make_face()
        with BuildLine():
            Line((24.5395016581, -12.05), (24.5395016581, -17.45))
            ThreePointArc((28.0395016581, -15.4176006311), (26.1592830786, -16.2095505764), (24.5395016581, -17.45))
            Line((28.0395016581, -12.05), (28.0395016581, -15.4176006311))
            Line((24.5395016581, -12.05), (28.0395016581, -12.05))
        make_face()
    extrude(amount=PAD004_DEPTH)

    # Sketch021 (on Face50 of Pad004) → Pocket013 (cut, two sides)
    with BuildSketch(Plane(origin=(0, -12.05, 0), x_dir=(-1, 0, 0), z_dir=(0, 1, 0))) as pocket013_sk:
        with BuildLine():
            Line((-24.8620157143, 6.5), (-28.0395016581, 6.5))
            Line((-28.0395016581, 6.5), (-28.0395016581, 2.1))
            ThreePointArc((-24.8620157143, 6.5), (-26.8441838951, 4.5841143344), (-28.0395016581, 2.1))
        make_face()
        with BuildLine():
            ThreePointArc((-25.9995016581, -4), (-25.0260575173, -3.5134441408), (-24.5395016581, -2.54))
            Line((-24.5395016581, -4), (-24.5395016581, -2.54))
            Line((-24.5395016581, -4), (-25.9995016581, -4))
        make_face()
        with BuildLine():
            Line((22.5019915649, -4), (22.5019915649, -2.54))
            ThreePointArc((22.5019915649, -2.54), (22.9885474241, -3.5134441408), (23.9619915649, -4))
            Line((22.5019915649, -4), (23.9619915649, -4))
        make_face()
        with BuildLine():
            Line((26.0019915649, 6.5), (26.0019915649, 2.1))
            ThreePointArc((26.0019915649, 2.1), (24.806673802, 4.5841143344), (22.8245056212, 6.5))
            Line((26.0019915649, 6.5), (22.8245056212, 6.5))
        make_face()
    extrude(amount=-POCKET013_DEPTH, mode=Mode.SUBTRACT)
    extrude(pocket013_sk.sketch, amount=POCKET013_DEPTH_BACK, mode=Mode.SUBTRACT)

    # Sketch022 (on Face66 of Pocket013) → Pocket014 (cut)
    with BuildSketch(Plane.XZ.offset(-12.05)):
        with Locations((-24.7019915649, -2.7)):
            Circle(SKETCH022_R)
        with Locations((26.7395016581, -2.7)):
            Circle(SKETCH022_R)
    extrude(amount=-POCKET014_DEPTH, mode=Mode.SUBTRACT)

    # Sketch023 (on Face49 of Pocket014) → Pocket015 (cut)
    with BuildSketch(Plane(origin=(0, -12.05, 0), x_dir=(-1, 0, 0), z_dir=(0, 1, 0))):
        with Locations((-26.7395016581, -2.7)):
            Circle(SKETCH023_R)
        with Locations((24.7019915649, -2.7)):
            Circle(SKETCH023_R)
    extrude(amount=-POCKET015_DEPTH, mode=Mode.SUBTRACT)


solid = part.part
